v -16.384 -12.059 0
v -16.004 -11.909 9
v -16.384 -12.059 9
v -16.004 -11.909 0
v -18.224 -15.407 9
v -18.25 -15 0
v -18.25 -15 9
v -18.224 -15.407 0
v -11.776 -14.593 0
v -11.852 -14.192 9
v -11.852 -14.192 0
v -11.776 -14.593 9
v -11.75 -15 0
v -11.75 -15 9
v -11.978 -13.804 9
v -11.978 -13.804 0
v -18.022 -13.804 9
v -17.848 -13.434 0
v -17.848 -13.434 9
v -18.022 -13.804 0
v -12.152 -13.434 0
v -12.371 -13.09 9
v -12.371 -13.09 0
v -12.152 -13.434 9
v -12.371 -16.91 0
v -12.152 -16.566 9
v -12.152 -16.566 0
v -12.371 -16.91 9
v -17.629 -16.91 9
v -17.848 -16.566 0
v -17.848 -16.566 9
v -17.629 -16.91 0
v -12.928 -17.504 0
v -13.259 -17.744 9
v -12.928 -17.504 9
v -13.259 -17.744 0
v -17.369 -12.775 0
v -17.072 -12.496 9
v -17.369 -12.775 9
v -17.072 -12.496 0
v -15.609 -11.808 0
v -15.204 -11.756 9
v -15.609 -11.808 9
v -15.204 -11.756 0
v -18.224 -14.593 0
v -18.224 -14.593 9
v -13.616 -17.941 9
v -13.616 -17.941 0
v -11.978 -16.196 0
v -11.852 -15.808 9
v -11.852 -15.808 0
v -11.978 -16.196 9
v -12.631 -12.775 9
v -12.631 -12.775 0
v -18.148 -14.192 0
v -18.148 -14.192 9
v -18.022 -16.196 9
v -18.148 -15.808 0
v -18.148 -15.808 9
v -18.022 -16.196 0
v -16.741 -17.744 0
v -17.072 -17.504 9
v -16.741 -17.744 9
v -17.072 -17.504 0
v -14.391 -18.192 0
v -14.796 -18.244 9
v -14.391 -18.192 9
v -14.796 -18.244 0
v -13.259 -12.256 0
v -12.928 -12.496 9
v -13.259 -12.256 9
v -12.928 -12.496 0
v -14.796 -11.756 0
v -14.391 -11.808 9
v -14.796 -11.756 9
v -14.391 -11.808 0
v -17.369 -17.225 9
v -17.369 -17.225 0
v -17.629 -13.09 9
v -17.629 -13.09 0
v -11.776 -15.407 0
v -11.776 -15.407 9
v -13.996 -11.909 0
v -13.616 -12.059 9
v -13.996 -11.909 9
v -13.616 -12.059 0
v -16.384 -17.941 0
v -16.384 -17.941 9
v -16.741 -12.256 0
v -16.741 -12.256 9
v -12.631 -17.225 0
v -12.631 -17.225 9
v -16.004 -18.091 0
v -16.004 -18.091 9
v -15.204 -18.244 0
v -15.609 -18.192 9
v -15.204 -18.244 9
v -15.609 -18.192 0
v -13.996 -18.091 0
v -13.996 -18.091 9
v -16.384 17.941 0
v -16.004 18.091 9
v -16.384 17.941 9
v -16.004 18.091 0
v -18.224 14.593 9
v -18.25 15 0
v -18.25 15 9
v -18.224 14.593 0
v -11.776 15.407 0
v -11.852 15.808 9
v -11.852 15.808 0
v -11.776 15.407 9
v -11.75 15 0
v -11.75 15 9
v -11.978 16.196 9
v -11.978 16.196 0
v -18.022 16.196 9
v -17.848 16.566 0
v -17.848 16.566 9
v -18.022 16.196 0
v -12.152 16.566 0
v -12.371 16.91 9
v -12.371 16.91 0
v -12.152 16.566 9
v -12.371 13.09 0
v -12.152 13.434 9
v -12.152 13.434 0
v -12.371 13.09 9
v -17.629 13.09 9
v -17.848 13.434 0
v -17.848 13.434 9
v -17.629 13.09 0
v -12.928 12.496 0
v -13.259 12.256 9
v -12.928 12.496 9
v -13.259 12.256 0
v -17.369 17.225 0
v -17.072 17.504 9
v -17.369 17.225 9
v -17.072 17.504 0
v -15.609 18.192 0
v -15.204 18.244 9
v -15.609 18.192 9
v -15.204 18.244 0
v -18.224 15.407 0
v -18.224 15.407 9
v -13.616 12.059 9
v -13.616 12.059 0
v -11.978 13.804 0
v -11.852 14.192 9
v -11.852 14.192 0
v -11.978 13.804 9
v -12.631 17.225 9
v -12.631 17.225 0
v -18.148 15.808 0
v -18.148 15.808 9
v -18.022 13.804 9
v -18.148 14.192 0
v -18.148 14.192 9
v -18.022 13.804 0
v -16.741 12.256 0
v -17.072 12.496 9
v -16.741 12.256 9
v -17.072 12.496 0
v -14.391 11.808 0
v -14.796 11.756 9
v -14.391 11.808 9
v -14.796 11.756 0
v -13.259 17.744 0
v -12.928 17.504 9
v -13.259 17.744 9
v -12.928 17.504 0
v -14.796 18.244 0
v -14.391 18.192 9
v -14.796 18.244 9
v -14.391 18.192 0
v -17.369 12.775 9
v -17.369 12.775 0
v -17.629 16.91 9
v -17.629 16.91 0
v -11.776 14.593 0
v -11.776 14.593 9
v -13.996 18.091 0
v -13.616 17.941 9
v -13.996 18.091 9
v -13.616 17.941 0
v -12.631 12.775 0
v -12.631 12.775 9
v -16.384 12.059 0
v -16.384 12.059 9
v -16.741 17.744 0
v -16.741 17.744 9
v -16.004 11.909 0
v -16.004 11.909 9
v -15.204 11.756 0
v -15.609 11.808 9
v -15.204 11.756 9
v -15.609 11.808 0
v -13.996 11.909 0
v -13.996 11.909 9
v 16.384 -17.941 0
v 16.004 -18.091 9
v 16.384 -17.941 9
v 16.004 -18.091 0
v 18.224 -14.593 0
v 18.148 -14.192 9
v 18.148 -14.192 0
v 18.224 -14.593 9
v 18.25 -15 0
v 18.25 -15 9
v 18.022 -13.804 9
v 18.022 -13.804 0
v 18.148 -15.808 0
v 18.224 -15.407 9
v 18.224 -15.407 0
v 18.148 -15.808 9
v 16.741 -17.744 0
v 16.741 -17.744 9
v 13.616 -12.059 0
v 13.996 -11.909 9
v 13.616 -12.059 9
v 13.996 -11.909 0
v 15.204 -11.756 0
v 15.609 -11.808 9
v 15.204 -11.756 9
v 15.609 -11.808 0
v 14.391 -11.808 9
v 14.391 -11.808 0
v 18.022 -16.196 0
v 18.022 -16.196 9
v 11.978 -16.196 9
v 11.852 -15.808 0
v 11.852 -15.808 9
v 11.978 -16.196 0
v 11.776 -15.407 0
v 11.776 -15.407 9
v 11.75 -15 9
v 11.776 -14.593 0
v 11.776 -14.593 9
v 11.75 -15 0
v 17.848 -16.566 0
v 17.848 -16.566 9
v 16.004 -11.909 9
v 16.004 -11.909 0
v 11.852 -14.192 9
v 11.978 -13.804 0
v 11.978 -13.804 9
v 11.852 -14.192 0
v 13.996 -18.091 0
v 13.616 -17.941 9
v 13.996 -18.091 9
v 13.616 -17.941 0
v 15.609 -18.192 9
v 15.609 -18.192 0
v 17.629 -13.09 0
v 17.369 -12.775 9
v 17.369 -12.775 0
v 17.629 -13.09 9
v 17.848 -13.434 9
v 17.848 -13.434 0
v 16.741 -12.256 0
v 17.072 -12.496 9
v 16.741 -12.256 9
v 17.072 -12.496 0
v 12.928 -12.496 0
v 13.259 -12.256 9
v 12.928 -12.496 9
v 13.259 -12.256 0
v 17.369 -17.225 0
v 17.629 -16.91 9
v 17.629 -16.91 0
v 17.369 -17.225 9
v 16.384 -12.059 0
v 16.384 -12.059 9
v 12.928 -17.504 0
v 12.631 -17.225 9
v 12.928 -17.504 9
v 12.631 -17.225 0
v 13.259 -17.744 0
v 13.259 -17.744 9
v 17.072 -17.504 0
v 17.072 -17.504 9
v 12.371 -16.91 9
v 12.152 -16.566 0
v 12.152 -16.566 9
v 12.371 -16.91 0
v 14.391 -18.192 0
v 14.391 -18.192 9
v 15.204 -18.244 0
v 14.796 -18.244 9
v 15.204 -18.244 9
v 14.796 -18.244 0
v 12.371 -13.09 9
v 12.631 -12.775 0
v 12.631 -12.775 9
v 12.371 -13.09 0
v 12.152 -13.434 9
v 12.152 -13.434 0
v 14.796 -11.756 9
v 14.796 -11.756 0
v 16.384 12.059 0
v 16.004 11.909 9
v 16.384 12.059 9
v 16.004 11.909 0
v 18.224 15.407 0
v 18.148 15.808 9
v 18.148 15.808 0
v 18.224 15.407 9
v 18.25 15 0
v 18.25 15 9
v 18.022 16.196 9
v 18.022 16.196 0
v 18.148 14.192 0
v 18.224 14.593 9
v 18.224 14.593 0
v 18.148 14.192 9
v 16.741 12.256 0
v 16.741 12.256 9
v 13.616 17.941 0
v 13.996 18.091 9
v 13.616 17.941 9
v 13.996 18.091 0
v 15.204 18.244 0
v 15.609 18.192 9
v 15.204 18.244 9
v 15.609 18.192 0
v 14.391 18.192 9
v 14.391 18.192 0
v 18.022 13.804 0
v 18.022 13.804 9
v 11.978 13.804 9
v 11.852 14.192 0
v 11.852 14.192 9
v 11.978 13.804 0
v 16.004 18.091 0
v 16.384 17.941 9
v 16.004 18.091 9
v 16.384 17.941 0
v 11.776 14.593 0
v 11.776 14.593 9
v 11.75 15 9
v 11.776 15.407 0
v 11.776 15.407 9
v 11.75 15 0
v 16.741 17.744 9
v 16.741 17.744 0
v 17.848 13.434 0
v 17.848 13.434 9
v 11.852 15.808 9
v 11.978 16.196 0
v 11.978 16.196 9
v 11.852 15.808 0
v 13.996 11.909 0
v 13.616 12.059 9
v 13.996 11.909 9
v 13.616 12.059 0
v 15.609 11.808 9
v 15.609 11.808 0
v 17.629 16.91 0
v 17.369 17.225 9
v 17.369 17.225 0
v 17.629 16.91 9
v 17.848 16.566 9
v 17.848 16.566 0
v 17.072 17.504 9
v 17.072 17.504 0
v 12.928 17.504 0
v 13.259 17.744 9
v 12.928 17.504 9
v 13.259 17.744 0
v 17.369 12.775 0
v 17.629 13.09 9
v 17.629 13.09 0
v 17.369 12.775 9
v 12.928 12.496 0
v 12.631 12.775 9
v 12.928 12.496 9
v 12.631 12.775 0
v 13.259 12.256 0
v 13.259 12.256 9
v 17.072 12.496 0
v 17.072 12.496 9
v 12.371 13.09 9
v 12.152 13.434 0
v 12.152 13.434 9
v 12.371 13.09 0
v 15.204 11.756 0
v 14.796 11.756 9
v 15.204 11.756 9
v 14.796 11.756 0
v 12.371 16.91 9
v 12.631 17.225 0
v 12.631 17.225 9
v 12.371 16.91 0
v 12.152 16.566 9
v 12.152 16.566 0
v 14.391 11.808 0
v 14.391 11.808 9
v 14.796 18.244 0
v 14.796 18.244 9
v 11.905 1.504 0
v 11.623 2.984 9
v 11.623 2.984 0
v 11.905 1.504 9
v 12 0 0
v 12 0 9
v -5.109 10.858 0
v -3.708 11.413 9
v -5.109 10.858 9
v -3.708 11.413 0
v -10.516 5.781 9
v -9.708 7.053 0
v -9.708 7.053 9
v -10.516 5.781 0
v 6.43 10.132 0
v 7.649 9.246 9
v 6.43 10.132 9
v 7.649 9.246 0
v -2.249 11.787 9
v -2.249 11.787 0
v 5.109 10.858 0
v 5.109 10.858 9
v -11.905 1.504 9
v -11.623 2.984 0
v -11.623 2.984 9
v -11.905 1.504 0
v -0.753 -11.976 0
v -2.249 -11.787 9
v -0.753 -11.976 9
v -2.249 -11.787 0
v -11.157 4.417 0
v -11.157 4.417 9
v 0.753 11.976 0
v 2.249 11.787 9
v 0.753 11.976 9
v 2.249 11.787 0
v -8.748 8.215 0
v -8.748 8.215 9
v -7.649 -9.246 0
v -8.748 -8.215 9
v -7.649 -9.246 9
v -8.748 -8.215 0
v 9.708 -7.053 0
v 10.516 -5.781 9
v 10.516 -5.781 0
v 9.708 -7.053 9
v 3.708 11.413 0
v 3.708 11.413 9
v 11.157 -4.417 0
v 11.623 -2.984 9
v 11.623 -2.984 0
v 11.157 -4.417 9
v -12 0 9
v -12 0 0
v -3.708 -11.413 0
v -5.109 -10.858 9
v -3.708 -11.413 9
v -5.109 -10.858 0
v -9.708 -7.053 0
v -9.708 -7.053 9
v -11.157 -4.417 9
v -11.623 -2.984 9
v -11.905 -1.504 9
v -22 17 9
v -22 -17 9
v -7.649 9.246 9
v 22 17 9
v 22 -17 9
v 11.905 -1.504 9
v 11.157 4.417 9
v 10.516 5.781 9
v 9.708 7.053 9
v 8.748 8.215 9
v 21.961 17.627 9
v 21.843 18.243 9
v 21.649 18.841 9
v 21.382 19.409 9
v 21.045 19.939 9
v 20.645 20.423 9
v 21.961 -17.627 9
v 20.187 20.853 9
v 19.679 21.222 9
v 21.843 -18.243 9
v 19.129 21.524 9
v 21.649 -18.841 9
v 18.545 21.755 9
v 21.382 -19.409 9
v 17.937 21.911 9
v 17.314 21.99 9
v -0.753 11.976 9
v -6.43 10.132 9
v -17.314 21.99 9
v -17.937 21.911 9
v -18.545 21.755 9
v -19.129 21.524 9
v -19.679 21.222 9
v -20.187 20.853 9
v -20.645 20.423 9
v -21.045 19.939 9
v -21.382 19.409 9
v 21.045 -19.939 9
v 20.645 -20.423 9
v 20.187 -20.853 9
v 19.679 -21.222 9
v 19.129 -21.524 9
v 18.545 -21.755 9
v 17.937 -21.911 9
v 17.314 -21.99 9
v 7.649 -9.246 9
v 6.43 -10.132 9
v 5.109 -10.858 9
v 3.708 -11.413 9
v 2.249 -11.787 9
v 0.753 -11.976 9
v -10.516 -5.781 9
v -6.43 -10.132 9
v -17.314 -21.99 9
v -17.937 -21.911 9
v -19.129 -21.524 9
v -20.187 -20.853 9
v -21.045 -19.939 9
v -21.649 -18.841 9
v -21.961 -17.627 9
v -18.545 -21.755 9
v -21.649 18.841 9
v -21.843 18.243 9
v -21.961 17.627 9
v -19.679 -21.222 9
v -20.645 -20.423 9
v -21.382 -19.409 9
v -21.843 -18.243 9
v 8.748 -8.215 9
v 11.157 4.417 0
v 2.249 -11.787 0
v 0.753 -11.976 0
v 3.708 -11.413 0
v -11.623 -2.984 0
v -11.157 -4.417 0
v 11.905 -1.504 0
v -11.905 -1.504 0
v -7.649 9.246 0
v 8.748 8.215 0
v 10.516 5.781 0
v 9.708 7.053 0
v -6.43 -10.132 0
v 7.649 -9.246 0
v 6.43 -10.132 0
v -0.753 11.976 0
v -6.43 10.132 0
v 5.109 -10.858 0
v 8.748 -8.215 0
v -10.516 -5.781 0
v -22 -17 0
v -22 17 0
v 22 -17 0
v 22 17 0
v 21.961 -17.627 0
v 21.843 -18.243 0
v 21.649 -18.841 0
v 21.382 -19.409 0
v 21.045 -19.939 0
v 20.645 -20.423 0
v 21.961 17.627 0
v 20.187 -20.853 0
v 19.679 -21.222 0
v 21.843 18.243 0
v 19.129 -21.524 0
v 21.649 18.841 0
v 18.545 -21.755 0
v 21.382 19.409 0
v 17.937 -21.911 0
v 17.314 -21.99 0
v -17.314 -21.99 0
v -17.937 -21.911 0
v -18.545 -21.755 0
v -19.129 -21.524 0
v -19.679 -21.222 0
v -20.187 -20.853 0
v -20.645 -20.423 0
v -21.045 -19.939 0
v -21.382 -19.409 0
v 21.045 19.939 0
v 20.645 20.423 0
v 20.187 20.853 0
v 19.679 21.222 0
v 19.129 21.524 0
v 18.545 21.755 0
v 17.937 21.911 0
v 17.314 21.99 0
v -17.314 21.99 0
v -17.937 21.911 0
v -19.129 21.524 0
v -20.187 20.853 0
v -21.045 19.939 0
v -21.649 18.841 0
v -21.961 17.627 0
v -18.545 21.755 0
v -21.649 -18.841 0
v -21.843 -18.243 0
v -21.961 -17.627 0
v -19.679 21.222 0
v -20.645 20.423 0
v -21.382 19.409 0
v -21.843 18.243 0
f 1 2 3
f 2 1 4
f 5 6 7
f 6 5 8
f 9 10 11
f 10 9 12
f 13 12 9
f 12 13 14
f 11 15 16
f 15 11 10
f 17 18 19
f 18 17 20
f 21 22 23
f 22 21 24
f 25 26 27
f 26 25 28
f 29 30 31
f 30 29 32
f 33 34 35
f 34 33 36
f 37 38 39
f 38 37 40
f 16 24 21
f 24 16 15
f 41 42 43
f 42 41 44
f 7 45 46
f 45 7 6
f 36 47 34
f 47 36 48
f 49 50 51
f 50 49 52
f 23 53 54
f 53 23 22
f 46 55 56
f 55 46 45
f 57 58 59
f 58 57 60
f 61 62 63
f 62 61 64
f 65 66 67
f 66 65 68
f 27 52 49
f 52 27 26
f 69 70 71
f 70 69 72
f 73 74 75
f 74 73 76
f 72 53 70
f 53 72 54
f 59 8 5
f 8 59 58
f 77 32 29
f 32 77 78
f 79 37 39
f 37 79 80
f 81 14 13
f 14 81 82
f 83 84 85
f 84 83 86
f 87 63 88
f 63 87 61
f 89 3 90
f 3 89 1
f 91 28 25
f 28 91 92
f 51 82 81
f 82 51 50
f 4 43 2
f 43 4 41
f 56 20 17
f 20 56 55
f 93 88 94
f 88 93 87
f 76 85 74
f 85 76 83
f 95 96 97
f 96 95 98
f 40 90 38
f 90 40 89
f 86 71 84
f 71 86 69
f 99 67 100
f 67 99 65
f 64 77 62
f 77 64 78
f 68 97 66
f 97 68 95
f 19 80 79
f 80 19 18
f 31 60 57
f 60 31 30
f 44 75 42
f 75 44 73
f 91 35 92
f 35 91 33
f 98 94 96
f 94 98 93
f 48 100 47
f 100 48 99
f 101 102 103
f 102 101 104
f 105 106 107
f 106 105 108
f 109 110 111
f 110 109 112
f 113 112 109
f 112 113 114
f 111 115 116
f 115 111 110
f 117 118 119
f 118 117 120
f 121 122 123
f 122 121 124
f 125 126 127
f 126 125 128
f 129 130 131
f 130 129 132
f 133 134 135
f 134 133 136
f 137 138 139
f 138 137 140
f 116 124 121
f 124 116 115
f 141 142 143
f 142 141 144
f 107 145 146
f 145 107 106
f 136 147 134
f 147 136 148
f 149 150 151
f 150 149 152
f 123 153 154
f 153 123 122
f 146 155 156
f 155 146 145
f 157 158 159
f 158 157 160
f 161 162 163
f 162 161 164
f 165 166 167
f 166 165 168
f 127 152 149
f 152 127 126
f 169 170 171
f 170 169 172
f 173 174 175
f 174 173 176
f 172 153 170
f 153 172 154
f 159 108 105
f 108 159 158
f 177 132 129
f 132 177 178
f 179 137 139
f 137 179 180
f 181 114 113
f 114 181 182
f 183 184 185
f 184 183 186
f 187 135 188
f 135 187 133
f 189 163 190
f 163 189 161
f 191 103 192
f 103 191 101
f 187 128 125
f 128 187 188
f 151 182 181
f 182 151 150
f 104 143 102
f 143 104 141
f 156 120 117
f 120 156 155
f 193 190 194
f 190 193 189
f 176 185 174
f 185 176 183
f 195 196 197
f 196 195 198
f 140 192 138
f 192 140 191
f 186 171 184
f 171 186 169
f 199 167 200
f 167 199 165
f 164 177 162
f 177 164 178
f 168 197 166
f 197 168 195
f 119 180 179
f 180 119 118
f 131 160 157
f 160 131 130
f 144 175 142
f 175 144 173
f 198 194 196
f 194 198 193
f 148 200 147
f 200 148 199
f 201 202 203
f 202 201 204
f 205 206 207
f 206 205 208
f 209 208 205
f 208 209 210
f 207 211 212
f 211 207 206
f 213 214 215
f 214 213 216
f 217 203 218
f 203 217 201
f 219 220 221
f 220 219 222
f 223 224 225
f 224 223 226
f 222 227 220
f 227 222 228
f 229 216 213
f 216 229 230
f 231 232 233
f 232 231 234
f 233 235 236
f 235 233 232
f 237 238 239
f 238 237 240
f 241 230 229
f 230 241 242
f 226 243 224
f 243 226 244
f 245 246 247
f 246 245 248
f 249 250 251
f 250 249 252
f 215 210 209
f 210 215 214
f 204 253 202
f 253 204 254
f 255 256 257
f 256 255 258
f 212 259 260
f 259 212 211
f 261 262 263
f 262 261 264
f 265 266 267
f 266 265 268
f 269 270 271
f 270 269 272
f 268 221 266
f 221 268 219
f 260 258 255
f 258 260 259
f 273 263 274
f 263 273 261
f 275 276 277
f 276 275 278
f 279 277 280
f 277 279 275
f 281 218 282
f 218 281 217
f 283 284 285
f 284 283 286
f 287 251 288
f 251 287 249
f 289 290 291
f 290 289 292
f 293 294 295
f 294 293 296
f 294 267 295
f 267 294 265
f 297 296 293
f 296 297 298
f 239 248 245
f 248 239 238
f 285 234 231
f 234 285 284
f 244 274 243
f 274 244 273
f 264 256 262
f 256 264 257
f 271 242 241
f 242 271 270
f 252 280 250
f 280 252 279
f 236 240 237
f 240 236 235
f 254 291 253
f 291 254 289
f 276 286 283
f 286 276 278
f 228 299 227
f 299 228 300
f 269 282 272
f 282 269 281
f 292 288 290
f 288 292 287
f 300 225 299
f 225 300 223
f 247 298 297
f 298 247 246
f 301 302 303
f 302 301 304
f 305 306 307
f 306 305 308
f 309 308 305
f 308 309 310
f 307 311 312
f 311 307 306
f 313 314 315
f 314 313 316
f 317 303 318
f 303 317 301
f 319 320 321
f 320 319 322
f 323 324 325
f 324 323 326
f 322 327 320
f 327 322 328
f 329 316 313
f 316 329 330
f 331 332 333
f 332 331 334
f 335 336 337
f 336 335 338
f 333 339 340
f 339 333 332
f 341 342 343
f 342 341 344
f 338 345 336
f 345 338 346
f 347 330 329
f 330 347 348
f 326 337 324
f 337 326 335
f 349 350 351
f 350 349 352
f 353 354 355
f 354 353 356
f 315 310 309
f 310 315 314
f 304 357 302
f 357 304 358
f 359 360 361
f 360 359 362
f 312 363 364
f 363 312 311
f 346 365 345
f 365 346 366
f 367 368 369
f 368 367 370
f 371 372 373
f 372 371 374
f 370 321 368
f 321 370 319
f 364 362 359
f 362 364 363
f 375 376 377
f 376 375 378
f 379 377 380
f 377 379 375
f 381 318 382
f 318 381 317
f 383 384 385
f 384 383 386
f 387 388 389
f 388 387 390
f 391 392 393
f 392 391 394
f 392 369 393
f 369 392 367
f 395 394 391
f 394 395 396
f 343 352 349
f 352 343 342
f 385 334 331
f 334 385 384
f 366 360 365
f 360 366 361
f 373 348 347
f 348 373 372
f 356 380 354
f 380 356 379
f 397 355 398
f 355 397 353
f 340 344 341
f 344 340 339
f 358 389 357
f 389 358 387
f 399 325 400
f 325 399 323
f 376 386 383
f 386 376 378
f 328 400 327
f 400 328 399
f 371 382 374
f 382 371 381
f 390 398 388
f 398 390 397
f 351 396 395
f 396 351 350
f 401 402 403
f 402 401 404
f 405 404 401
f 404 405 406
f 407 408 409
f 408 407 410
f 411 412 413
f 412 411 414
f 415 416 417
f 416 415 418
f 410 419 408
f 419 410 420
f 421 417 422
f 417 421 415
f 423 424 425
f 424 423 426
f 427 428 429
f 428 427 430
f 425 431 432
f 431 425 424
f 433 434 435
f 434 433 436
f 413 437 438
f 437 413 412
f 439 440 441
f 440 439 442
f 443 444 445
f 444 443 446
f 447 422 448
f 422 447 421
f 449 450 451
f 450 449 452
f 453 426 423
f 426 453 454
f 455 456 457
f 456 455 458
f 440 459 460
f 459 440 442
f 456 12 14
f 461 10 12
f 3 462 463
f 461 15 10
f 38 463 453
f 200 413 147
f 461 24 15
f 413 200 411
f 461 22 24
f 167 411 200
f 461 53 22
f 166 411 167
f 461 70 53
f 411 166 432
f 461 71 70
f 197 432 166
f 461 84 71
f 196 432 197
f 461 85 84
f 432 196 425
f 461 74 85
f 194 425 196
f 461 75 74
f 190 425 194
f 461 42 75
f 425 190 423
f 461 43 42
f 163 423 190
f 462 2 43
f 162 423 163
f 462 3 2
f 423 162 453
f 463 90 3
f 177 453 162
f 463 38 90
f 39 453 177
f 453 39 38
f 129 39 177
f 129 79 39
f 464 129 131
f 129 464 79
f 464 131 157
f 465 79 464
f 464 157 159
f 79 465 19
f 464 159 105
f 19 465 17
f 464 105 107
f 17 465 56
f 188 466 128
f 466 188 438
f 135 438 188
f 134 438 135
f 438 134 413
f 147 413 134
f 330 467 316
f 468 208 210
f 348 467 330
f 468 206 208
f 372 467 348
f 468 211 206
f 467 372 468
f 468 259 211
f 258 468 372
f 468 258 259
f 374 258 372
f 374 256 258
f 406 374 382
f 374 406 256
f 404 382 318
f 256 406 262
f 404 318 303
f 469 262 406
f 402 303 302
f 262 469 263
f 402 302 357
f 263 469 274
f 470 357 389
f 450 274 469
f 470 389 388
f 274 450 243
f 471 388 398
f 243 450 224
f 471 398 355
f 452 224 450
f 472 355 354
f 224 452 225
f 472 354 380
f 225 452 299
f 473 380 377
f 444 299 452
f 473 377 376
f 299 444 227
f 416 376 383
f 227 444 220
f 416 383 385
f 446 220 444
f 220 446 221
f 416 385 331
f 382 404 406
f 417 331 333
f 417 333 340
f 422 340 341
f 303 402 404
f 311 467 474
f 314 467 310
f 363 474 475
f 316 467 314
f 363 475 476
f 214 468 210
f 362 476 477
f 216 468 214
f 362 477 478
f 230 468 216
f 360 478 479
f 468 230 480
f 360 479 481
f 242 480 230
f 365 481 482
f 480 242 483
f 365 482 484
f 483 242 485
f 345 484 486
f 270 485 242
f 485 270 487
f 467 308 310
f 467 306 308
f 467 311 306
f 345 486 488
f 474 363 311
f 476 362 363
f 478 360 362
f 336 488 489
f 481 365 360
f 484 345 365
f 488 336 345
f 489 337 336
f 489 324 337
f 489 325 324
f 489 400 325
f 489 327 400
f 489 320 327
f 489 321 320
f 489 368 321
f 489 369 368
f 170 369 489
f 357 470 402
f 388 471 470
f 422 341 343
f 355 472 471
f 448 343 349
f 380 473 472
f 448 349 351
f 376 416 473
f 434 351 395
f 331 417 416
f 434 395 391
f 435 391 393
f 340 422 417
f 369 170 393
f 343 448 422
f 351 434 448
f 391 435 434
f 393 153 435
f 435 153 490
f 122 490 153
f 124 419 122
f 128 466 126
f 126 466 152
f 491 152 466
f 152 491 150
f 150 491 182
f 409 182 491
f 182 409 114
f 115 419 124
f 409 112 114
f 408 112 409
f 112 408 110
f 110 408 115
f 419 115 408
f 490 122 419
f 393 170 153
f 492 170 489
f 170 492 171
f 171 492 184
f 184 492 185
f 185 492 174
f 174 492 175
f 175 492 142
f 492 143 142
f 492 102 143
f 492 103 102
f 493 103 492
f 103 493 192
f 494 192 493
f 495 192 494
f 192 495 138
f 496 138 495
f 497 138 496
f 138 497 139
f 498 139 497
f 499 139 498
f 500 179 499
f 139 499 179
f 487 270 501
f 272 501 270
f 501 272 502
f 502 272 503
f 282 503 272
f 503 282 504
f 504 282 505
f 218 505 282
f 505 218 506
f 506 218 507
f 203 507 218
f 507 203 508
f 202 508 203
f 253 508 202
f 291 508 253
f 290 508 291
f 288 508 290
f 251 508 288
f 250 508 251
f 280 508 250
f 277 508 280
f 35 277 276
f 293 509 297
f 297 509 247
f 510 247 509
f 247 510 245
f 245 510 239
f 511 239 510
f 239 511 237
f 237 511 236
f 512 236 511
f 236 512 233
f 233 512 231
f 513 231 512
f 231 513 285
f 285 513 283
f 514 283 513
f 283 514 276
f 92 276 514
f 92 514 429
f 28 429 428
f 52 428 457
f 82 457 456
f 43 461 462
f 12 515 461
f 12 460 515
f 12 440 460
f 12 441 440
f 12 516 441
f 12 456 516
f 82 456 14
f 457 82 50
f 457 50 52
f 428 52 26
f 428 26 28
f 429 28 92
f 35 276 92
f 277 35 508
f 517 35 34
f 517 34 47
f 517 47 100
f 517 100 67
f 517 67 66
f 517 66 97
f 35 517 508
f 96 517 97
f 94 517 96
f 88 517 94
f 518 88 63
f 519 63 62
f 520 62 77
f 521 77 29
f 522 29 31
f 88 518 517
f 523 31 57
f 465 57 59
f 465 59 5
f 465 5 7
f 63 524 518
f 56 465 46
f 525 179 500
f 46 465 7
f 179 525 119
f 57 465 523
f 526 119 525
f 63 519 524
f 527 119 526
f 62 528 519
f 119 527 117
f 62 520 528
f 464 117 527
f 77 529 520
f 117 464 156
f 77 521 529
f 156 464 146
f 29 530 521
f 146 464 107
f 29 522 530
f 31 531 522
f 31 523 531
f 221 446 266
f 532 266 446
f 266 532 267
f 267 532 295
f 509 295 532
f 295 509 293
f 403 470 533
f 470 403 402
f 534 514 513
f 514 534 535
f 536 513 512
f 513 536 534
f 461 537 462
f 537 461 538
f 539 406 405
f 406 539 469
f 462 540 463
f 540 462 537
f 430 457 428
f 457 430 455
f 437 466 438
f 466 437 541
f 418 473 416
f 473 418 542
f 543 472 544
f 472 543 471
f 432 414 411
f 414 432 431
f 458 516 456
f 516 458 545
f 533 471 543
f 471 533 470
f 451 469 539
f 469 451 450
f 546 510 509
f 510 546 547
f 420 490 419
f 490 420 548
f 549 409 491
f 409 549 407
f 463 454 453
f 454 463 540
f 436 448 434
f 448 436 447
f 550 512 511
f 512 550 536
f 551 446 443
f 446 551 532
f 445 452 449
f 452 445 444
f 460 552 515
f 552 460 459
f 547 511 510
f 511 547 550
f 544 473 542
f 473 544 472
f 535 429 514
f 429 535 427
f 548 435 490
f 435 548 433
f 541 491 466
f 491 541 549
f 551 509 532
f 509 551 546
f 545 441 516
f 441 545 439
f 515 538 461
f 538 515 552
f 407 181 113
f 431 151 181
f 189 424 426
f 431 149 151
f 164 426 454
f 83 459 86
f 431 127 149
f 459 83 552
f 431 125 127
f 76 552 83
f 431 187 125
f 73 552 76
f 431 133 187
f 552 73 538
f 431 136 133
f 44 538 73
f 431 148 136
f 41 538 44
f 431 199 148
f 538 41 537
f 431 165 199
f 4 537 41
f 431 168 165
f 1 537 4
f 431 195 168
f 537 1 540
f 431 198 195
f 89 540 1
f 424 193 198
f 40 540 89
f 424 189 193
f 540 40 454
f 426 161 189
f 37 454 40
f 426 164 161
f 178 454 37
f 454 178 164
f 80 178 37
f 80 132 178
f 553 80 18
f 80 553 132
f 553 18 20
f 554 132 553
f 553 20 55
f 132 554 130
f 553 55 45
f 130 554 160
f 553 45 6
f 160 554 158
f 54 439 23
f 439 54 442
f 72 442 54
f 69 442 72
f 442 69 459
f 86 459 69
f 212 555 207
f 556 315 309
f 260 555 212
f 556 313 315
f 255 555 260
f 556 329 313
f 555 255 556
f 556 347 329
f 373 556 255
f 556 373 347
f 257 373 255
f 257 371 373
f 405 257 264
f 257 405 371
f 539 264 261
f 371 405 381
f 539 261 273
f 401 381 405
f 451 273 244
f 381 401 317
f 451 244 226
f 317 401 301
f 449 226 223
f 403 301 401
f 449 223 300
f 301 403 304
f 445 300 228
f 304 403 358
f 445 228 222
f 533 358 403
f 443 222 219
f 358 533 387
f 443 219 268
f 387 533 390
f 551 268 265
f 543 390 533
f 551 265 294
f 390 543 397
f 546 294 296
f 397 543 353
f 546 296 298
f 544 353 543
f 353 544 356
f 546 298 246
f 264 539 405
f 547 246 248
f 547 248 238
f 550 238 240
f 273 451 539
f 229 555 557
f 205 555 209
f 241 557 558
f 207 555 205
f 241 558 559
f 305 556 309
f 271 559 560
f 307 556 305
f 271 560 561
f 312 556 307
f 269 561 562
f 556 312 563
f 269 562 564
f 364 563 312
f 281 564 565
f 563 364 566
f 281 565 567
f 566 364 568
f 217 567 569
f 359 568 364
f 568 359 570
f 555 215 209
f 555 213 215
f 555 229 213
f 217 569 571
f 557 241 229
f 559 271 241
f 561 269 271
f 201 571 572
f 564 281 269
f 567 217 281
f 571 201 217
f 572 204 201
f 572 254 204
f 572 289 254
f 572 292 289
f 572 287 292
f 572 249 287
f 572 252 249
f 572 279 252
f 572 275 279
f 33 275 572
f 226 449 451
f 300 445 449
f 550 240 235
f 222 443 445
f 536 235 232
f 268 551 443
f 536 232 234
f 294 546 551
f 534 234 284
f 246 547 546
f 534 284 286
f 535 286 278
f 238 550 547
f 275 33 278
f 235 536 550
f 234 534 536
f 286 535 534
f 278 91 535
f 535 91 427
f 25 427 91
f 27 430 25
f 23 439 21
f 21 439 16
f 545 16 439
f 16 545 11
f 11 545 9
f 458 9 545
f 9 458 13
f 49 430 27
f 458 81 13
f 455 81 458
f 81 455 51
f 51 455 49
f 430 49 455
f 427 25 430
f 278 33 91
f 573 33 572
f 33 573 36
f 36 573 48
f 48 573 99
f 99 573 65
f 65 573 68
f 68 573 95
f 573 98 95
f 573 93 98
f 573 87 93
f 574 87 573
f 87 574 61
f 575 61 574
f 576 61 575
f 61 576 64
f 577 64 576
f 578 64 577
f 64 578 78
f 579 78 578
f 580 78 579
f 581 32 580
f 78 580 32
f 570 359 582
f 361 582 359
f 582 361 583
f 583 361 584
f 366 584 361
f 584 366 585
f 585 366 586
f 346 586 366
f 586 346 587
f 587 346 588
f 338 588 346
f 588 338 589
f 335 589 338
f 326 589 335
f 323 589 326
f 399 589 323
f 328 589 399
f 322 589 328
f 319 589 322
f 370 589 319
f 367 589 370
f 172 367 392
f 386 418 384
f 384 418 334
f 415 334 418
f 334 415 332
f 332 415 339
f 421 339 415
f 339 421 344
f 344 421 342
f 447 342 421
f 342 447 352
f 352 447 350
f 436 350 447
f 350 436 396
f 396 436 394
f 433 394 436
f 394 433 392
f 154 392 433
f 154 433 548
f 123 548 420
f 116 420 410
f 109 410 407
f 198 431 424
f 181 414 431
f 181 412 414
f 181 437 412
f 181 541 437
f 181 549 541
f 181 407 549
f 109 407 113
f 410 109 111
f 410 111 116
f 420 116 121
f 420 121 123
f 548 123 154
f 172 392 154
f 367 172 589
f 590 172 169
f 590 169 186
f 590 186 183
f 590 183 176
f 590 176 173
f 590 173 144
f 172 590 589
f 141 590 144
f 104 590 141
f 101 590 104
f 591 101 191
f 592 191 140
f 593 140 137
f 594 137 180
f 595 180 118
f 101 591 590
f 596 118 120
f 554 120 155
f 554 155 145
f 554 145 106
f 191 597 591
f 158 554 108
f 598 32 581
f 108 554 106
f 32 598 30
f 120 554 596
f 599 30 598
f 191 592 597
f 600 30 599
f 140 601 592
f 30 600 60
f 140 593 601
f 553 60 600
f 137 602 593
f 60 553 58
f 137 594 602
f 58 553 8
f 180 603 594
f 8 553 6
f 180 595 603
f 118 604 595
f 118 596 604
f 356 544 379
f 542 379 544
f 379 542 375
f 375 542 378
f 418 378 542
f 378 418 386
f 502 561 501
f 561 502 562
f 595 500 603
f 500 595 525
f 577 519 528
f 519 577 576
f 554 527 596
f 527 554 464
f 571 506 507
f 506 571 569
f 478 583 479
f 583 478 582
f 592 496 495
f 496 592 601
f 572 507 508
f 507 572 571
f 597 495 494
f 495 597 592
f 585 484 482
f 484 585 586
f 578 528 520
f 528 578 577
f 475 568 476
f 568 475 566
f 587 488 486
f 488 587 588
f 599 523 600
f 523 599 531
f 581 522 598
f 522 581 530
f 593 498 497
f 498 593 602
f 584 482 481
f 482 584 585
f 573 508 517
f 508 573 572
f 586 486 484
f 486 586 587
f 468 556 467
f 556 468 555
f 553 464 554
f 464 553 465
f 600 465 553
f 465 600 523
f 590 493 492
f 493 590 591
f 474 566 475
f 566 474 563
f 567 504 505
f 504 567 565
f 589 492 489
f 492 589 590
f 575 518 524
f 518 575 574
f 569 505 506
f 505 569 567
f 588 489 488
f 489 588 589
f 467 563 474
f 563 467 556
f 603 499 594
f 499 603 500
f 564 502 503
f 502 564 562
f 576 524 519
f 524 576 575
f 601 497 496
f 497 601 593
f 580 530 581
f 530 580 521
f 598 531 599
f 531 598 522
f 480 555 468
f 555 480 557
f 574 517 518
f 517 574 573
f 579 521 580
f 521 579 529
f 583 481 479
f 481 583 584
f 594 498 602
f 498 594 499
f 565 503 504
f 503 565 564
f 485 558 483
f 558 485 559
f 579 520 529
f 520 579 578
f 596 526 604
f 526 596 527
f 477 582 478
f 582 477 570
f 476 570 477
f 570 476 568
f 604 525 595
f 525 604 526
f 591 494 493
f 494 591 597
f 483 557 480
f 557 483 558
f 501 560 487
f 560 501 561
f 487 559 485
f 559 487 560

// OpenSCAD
$fn = 50;

difference() {
	union() {
		hull() {
			translate(v = [-17.0, 17.0, 0]) {
				cylinder(h = 9, r = 5);
			}
			translate(v = [17.0, 17.0, 0]) {
				cylinder(h = 9, r = 5);
			}
			translate(v = [-17.0, -17.0, 0]) {
				cylinder(h = 9, r = 5);
			}
			translate(v = [17.0, -17.0, 0]) {
				cylinder(h = 9, r = 5);
			}
		}
	}
	union() {
		translate(v = [-15.0, -15.0, -100.0]) {
			cylinder(h = 200, r = 3.25);
		}
		translate(v = [-15.0, 15.0, -100.0]) {
			cylinder(h = 200, r = 3.25);
		}
		translate(v = [15.0, -15.0, -100.0]) {
			cylinder(h = 200, r = 3.25);
		}
		translate(v = [15.0, 15.0, -100.0]) {
			cylinder(h = 200, r = 3.25);
		}
		translate(v = [-15.0, -15.0, -100.0]) {
			cylinder(h = 200, r = 1.8);
		}
		translate(v = [-15.0, 15.0, -100.0]) {
			cylinder(h = 200, r = 1.8);
		}
		translate(v = [15.0, -15.0, -100.0]) {
			cylinder(h = 200, r = 1.8);
		}
		translate(v = [15.0, 15.0, -100.0]) {
			cylinder(h = 200, r = 1.8);
		}
		cylinder(h = 9, r = 12.0);
	}
}
